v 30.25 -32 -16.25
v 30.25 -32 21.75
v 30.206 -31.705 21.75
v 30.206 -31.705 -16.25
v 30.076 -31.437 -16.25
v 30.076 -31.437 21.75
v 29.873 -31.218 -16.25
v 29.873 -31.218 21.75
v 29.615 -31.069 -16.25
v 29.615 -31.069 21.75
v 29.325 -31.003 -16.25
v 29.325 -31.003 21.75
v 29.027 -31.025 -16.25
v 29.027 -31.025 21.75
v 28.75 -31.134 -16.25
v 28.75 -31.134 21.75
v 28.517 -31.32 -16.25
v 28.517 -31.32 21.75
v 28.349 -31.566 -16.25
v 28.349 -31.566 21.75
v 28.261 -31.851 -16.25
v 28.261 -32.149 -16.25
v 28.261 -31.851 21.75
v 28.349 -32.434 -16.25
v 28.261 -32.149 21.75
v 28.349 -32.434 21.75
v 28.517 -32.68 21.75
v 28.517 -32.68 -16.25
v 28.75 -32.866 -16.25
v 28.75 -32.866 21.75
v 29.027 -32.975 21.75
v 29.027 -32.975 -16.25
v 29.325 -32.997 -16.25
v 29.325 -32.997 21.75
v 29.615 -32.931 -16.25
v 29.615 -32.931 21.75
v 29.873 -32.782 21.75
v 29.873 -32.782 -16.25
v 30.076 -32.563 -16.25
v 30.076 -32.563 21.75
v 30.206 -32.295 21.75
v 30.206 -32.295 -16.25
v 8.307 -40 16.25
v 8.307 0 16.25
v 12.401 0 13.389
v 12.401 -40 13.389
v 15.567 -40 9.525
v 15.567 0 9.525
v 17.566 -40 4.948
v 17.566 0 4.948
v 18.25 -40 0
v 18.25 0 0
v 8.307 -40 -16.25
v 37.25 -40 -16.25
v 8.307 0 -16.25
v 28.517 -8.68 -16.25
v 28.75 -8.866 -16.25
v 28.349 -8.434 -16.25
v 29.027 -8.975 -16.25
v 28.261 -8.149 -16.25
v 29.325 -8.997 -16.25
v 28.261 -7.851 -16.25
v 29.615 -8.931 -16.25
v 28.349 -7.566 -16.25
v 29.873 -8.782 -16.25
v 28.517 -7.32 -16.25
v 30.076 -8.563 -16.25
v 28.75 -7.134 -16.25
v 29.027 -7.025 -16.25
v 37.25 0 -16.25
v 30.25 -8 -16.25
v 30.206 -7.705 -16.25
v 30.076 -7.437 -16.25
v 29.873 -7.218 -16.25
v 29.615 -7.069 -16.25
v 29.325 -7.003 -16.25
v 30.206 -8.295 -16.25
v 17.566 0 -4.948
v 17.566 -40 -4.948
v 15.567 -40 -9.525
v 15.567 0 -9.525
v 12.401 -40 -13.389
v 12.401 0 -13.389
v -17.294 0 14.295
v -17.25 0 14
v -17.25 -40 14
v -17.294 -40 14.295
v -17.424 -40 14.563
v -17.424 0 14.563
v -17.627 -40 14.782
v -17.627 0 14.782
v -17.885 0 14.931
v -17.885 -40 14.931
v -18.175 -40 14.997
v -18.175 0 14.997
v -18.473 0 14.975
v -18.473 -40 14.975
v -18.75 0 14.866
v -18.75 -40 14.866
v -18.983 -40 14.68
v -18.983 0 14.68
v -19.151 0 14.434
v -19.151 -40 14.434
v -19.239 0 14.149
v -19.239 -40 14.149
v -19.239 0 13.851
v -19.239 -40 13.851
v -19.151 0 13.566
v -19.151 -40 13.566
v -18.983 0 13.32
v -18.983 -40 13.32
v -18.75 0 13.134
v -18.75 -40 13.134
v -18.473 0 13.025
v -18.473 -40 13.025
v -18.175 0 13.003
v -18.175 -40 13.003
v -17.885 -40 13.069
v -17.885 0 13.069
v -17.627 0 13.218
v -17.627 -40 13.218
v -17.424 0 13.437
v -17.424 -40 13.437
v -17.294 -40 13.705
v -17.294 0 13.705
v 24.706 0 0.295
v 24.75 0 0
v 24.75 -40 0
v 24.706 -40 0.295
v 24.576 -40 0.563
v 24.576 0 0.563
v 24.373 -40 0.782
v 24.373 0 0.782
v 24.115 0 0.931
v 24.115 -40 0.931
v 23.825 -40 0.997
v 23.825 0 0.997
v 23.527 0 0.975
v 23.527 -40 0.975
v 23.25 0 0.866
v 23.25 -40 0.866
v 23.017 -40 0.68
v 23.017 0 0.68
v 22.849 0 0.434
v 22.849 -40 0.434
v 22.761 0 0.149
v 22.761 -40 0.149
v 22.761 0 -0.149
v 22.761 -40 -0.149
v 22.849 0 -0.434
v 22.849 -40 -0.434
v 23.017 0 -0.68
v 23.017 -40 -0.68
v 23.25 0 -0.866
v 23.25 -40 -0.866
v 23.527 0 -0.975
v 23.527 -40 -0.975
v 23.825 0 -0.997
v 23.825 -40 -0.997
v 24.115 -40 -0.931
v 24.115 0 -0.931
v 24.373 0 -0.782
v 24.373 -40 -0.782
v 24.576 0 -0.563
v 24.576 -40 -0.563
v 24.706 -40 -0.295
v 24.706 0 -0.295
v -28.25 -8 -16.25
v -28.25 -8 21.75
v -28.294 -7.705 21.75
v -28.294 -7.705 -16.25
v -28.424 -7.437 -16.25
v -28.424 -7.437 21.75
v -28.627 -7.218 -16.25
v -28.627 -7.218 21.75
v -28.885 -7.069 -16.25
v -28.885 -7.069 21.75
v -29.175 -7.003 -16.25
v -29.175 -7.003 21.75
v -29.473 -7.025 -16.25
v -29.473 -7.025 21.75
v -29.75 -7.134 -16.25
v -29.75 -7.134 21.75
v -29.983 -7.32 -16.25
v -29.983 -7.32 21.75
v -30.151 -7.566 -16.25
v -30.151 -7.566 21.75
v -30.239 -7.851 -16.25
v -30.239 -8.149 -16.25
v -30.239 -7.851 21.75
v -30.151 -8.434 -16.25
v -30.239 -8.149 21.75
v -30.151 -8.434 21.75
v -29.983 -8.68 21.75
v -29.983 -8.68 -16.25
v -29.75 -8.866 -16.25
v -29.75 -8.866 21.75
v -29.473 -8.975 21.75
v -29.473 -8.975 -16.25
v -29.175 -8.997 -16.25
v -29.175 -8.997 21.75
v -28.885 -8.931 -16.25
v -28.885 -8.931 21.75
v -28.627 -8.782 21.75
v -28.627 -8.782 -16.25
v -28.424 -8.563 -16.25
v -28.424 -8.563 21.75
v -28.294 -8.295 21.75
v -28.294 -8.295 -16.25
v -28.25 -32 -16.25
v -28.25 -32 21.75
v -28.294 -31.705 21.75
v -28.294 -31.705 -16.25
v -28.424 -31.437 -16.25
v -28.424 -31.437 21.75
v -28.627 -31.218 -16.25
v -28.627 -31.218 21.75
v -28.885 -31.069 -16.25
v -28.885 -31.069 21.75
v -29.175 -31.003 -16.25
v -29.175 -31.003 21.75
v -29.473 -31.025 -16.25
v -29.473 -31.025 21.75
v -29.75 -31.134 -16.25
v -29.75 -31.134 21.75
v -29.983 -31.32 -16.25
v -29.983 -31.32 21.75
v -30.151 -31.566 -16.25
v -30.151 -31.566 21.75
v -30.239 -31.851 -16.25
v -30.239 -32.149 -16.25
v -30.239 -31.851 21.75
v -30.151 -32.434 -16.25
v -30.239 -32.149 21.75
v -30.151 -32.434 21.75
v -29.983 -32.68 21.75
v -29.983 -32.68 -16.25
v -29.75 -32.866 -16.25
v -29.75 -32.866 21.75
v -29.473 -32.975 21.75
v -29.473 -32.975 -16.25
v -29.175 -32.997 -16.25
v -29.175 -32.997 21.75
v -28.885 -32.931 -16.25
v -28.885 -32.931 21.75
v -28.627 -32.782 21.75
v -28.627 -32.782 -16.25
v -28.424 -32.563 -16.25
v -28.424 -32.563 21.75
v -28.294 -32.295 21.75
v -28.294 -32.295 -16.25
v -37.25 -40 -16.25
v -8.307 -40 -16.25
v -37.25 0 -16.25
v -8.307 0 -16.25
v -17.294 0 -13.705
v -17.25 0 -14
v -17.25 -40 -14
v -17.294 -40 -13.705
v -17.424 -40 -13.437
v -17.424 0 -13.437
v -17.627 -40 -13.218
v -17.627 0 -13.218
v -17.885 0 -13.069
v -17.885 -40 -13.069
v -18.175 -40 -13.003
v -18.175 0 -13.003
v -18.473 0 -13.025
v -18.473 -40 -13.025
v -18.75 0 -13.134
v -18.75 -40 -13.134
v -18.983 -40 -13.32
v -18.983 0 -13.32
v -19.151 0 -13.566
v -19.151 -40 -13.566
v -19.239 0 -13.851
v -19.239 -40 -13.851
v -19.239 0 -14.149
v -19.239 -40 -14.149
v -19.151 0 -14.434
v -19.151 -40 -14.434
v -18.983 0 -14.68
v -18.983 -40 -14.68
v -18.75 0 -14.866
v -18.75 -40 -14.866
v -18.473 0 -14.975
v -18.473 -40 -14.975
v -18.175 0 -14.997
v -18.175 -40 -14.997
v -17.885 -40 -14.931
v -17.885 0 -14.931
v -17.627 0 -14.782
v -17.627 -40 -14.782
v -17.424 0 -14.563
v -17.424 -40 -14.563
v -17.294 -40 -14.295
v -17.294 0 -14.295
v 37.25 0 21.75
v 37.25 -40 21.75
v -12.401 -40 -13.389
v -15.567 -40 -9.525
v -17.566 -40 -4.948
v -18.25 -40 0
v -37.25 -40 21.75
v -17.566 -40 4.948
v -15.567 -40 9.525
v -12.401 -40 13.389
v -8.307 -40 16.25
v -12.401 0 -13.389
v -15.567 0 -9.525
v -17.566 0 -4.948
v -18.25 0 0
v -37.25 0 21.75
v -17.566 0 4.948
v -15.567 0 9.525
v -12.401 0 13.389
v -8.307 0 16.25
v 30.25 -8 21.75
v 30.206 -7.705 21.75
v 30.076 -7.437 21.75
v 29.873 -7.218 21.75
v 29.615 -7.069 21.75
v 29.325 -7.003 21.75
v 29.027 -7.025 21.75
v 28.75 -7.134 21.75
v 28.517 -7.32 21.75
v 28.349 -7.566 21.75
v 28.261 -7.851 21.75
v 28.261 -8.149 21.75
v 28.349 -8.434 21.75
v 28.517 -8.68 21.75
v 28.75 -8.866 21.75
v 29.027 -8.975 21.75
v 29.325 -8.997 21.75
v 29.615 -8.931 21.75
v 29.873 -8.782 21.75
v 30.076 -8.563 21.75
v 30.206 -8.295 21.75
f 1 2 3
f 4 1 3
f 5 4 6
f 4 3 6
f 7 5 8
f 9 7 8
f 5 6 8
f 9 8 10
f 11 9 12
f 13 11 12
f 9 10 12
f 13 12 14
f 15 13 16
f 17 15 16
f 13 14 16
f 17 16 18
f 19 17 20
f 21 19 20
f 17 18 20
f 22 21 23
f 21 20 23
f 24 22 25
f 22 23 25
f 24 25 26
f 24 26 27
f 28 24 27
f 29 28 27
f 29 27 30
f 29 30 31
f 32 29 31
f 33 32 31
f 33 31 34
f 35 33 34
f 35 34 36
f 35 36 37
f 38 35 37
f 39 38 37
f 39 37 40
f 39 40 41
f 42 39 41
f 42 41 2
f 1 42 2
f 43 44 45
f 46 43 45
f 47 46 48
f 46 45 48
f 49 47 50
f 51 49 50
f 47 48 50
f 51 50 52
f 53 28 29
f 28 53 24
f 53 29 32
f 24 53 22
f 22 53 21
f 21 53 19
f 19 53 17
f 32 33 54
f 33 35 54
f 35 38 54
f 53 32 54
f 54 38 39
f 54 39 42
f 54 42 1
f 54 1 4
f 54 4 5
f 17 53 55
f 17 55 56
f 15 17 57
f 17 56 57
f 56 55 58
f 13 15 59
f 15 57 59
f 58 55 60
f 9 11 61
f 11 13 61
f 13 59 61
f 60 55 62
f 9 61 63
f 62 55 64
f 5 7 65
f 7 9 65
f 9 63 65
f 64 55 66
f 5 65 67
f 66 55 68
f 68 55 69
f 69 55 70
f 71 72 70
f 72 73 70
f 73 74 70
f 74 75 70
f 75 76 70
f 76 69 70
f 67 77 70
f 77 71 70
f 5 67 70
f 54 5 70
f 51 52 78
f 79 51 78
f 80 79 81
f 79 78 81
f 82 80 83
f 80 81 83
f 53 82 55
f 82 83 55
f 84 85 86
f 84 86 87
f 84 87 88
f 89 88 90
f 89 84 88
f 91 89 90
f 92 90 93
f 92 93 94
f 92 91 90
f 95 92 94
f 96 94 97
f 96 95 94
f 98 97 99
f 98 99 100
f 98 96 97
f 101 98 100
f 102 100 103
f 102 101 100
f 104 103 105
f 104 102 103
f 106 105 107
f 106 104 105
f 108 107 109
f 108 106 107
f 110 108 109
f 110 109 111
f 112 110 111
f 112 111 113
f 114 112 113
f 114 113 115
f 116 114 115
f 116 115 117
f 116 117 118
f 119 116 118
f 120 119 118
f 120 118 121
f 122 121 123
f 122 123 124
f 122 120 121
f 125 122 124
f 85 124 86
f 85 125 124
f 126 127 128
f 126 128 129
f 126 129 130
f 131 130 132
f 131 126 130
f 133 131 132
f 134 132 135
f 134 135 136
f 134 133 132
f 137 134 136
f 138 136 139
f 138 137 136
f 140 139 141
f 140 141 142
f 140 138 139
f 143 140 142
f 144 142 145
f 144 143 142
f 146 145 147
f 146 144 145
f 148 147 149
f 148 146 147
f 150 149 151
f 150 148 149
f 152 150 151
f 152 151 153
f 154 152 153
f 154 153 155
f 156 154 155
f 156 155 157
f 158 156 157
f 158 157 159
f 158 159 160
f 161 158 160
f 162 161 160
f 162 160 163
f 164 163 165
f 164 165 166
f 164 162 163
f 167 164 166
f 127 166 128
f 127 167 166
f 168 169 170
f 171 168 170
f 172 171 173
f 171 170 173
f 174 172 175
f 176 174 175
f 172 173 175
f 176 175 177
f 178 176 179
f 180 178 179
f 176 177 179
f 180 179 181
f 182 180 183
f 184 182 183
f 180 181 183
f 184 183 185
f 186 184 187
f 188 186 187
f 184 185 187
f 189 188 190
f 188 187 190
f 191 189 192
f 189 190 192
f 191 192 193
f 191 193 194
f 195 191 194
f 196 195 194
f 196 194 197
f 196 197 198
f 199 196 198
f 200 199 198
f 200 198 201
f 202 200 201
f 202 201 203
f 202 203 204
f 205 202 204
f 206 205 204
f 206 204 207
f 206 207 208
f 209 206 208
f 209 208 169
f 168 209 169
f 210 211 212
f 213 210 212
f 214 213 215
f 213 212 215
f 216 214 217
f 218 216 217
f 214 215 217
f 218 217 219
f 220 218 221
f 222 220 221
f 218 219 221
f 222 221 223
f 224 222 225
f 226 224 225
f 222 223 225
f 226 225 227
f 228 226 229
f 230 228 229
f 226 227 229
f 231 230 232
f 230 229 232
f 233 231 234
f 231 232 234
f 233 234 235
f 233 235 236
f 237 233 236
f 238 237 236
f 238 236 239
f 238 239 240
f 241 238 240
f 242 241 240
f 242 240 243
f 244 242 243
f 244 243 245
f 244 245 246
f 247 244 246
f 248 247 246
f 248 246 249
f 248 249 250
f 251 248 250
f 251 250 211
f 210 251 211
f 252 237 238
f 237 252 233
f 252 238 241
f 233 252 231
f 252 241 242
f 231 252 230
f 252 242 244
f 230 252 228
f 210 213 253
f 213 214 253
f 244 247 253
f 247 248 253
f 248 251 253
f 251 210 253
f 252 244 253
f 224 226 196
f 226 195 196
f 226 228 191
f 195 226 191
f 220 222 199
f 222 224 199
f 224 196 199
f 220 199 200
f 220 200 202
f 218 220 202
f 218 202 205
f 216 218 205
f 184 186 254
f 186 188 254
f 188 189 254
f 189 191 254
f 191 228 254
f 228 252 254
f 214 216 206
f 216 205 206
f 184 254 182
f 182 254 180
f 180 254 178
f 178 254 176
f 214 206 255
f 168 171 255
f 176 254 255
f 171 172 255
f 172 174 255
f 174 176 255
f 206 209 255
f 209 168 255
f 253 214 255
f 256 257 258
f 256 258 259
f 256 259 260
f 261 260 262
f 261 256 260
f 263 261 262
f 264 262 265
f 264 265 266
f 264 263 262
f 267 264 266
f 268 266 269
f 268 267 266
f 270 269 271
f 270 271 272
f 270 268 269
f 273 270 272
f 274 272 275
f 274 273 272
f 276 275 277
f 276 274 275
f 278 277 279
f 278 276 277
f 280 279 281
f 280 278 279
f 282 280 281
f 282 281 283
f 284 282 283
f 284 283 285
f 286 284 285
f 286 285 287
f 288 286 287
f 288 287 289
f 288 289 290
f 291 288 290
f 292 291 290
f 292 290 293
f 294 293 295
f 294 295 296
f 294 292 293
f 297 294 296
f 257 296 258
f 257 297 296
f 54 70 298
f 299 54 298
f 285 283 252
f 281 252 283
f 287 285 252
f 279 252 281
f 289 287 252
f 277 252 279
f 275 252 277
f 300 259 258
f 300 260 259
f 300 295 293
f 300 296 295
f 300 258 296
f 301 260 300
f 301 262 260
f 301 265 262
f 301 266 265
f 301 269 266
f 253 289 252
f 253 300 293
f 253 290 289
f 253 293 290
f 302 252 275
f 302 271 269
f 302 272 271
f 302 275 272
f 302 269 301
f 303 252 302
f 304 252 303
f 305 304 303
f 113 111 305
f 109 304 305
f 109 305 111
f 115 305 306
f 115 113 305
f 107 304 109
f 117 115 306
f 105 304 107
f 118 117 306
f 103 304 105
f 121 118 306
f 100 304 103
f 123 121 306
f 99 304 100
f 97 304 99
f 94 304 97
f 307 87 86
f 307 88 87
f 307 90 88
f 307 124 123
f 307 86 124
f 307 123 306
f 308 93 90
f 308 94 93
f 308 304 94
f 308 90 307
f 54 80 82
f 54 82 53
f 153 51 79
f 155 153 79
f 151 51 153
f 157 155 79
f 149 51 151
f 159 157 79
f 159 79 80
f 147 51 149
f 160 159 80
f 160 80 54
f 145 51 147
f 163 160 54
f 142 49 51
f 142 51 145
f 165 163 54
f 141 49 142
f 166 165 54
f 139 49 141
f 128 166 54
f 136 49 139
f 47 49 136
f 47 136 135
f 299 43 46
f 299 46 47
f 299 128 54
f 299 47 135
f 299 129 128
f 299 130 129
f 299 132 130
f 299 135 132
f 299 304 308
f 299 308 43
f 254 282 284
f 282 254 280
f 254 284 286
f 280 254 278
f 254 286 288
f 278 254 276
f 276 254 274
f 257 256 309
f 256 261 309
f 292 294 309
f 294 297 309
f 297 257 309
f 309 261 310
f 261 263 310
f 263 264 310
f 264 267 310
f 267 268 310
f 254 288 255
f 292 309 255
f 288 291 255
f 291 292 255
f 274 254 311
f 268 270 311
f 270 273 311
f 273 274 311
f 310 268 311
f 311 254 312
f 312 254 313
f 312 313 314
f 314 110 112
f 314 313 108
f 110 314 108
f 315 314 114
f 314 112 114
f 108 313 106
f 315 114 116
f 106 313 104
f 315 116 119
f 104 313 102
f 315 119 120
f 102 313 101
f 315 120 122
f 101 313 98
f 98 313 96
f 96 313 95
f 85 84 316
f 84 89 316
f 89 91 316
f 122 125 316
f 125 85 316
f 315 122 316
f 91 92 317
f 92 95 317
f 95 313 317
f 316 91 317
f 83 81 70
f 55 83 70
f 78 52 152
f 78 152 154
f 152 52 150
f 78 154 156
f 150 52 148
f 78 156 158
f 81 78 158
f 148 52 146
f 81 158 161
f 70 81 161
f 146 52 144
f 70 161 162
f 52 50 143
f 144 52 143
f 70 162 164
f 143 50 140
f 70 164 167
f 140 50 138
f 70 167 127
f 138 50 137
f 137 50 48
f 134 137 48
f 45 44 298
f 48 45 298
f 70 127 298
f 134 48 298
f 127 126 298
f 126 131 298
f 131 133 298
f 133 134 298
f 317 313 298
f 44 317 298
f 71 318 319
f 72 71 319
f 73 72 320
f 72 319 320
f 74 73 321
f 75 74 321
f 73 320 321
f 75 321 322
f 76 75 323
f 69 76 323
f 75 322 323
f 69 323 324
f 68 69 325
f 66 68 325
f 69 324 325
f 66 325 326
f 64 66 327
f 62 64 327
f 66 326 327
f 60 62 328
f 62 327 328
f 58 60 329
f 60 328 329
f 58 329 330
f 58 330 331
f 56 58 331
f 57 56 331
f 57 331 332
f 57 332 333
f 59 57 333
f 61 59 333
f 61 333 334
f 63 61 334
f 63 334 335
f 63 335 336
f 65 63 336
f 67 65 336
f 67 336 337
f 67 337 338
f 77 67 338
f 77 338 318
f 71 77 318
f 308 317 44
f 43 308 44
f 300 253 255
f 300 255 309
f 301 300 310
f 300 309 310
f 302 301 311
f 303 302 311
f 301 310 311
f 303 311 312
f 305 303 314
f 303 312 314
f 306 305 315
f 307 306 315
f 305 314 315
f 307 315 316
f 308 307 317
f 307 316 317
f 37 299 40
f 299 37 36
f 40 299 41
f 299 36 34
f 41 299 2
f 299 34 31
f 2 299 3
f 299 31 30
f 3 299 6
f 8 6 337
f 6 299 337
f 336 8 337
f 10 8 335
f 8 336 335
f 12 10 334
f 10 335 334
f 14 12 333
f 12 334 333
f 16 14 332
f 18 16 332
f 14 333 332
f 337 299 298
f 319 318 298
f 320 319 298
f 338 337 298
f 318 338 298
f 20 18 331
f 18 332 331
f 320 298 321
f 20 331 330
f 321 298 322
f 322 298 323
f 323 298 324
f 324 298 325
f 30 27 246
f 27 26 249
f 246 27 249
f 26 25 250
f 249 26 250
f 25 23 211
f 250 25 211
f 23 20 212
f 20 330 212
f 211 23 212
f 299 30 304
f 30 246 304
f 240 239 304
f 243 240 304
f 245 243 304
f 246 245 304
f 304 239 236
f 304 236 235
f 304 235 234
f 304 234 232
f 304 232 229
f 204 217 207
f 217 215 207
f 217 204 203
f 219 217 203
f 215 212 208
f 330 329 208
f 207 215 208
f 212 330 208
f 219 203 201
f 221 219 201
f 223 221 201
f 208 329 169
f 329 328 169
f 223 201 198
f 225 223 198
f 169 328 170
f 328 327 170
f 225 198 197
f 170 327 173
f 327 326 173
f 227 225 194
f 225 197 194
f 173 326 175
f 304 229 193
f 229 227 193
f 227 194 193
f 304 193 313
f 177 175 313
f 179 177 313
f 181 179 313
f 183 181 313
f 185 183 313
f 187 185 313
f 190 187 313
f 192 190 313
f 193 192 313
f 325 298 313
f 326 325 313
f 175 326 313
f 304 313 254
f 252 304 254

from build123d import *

# Parameters (mm, degrees)
F0_R     = 1
F1_DEPTH = 40
F2_R     = 1
F3_DEPTH = 46.1


with BuildPart() as f1:
    # F0 (on Front) → F1 (new body)
    with BuildSketch(Plane.XZ):
        with BuildLine():
            Line((-8.306624, 16.25), (-37.25, 16.25))
            Line((-37.25, 16.25), (-37.25, -16.25))
            Line((-37.25, -16.25), (-8.306624, -16.25))
            ThreePointArc((-8.306624, -16.25), (-18.25, 0), (-8.306624, 16.25))
        make_face()
        with Locations((-18.25, -14)):
            Circle(F0_R, mode=Mode.SUBTRACT)
        with Locations((-18.25, 14)):
            Circle(F0_R, mode=Mode.SUBTRACT)
        with BuildLine():
            Line((37.25, 21.75), (-37.25, 21.75))
            Line((-37.25, 21.75), (-37.25, 16.25))
            Line((-37.25, 16.25), (-8.306624, 16.25))
            ThreePointArc((-8.306624, 16.25), (0, 18.25), (8.306624, 16.25))
            Line((8.306624, 16.25), (37.25, 16.25))
            Line((37.25, 16.25), (37.25, 21.75))
        make_face()
        with BuildLine():
            Line((37.25, -16.25), (37.25, 16.25))
            Line((37.25, 16.25), (8.306624, 16.25))
            ThreePointArc((8.306624, 16.25), (15.566926, 9.525403), (18.25, 0))
            ThreePointArc((18.25, 0), (15.566926, -9.525403), (8.306624, -16.25))
            Line((8.306624, -16.25), (37.25, -16.25))
        make_face()
        with Locations((23.75, 0)):
            Circle(F0_R, mode=Mode.SUBTRACT)
        with BuildLine():
            ThreePointArc((8.306624, 16.25), (0, 18.25), (-8.306624, 16.25))
            Line((-8.306624, 16.25), (8.306624, 16.25))
        make_face()
    extrude(amount=F1_DEPTH)

    # F2 (on face) → F3 (cut)
    with BuildSketch(Plane.XY.offset(21.75)):
        with Locations((-29.25, -8)):
            Circle(F2_R)
        with Locations((-29.25, -32)):
            Circle(F2_R)
        with Locations((29.25, -32)):
            Circle(F2_R)
        with Locations((29.25, -8)):
            Circle(F2_R)
    extrude(amount=-F3_DEPTH, mode=Mode.SUBTRACT)


solid = f1.part
